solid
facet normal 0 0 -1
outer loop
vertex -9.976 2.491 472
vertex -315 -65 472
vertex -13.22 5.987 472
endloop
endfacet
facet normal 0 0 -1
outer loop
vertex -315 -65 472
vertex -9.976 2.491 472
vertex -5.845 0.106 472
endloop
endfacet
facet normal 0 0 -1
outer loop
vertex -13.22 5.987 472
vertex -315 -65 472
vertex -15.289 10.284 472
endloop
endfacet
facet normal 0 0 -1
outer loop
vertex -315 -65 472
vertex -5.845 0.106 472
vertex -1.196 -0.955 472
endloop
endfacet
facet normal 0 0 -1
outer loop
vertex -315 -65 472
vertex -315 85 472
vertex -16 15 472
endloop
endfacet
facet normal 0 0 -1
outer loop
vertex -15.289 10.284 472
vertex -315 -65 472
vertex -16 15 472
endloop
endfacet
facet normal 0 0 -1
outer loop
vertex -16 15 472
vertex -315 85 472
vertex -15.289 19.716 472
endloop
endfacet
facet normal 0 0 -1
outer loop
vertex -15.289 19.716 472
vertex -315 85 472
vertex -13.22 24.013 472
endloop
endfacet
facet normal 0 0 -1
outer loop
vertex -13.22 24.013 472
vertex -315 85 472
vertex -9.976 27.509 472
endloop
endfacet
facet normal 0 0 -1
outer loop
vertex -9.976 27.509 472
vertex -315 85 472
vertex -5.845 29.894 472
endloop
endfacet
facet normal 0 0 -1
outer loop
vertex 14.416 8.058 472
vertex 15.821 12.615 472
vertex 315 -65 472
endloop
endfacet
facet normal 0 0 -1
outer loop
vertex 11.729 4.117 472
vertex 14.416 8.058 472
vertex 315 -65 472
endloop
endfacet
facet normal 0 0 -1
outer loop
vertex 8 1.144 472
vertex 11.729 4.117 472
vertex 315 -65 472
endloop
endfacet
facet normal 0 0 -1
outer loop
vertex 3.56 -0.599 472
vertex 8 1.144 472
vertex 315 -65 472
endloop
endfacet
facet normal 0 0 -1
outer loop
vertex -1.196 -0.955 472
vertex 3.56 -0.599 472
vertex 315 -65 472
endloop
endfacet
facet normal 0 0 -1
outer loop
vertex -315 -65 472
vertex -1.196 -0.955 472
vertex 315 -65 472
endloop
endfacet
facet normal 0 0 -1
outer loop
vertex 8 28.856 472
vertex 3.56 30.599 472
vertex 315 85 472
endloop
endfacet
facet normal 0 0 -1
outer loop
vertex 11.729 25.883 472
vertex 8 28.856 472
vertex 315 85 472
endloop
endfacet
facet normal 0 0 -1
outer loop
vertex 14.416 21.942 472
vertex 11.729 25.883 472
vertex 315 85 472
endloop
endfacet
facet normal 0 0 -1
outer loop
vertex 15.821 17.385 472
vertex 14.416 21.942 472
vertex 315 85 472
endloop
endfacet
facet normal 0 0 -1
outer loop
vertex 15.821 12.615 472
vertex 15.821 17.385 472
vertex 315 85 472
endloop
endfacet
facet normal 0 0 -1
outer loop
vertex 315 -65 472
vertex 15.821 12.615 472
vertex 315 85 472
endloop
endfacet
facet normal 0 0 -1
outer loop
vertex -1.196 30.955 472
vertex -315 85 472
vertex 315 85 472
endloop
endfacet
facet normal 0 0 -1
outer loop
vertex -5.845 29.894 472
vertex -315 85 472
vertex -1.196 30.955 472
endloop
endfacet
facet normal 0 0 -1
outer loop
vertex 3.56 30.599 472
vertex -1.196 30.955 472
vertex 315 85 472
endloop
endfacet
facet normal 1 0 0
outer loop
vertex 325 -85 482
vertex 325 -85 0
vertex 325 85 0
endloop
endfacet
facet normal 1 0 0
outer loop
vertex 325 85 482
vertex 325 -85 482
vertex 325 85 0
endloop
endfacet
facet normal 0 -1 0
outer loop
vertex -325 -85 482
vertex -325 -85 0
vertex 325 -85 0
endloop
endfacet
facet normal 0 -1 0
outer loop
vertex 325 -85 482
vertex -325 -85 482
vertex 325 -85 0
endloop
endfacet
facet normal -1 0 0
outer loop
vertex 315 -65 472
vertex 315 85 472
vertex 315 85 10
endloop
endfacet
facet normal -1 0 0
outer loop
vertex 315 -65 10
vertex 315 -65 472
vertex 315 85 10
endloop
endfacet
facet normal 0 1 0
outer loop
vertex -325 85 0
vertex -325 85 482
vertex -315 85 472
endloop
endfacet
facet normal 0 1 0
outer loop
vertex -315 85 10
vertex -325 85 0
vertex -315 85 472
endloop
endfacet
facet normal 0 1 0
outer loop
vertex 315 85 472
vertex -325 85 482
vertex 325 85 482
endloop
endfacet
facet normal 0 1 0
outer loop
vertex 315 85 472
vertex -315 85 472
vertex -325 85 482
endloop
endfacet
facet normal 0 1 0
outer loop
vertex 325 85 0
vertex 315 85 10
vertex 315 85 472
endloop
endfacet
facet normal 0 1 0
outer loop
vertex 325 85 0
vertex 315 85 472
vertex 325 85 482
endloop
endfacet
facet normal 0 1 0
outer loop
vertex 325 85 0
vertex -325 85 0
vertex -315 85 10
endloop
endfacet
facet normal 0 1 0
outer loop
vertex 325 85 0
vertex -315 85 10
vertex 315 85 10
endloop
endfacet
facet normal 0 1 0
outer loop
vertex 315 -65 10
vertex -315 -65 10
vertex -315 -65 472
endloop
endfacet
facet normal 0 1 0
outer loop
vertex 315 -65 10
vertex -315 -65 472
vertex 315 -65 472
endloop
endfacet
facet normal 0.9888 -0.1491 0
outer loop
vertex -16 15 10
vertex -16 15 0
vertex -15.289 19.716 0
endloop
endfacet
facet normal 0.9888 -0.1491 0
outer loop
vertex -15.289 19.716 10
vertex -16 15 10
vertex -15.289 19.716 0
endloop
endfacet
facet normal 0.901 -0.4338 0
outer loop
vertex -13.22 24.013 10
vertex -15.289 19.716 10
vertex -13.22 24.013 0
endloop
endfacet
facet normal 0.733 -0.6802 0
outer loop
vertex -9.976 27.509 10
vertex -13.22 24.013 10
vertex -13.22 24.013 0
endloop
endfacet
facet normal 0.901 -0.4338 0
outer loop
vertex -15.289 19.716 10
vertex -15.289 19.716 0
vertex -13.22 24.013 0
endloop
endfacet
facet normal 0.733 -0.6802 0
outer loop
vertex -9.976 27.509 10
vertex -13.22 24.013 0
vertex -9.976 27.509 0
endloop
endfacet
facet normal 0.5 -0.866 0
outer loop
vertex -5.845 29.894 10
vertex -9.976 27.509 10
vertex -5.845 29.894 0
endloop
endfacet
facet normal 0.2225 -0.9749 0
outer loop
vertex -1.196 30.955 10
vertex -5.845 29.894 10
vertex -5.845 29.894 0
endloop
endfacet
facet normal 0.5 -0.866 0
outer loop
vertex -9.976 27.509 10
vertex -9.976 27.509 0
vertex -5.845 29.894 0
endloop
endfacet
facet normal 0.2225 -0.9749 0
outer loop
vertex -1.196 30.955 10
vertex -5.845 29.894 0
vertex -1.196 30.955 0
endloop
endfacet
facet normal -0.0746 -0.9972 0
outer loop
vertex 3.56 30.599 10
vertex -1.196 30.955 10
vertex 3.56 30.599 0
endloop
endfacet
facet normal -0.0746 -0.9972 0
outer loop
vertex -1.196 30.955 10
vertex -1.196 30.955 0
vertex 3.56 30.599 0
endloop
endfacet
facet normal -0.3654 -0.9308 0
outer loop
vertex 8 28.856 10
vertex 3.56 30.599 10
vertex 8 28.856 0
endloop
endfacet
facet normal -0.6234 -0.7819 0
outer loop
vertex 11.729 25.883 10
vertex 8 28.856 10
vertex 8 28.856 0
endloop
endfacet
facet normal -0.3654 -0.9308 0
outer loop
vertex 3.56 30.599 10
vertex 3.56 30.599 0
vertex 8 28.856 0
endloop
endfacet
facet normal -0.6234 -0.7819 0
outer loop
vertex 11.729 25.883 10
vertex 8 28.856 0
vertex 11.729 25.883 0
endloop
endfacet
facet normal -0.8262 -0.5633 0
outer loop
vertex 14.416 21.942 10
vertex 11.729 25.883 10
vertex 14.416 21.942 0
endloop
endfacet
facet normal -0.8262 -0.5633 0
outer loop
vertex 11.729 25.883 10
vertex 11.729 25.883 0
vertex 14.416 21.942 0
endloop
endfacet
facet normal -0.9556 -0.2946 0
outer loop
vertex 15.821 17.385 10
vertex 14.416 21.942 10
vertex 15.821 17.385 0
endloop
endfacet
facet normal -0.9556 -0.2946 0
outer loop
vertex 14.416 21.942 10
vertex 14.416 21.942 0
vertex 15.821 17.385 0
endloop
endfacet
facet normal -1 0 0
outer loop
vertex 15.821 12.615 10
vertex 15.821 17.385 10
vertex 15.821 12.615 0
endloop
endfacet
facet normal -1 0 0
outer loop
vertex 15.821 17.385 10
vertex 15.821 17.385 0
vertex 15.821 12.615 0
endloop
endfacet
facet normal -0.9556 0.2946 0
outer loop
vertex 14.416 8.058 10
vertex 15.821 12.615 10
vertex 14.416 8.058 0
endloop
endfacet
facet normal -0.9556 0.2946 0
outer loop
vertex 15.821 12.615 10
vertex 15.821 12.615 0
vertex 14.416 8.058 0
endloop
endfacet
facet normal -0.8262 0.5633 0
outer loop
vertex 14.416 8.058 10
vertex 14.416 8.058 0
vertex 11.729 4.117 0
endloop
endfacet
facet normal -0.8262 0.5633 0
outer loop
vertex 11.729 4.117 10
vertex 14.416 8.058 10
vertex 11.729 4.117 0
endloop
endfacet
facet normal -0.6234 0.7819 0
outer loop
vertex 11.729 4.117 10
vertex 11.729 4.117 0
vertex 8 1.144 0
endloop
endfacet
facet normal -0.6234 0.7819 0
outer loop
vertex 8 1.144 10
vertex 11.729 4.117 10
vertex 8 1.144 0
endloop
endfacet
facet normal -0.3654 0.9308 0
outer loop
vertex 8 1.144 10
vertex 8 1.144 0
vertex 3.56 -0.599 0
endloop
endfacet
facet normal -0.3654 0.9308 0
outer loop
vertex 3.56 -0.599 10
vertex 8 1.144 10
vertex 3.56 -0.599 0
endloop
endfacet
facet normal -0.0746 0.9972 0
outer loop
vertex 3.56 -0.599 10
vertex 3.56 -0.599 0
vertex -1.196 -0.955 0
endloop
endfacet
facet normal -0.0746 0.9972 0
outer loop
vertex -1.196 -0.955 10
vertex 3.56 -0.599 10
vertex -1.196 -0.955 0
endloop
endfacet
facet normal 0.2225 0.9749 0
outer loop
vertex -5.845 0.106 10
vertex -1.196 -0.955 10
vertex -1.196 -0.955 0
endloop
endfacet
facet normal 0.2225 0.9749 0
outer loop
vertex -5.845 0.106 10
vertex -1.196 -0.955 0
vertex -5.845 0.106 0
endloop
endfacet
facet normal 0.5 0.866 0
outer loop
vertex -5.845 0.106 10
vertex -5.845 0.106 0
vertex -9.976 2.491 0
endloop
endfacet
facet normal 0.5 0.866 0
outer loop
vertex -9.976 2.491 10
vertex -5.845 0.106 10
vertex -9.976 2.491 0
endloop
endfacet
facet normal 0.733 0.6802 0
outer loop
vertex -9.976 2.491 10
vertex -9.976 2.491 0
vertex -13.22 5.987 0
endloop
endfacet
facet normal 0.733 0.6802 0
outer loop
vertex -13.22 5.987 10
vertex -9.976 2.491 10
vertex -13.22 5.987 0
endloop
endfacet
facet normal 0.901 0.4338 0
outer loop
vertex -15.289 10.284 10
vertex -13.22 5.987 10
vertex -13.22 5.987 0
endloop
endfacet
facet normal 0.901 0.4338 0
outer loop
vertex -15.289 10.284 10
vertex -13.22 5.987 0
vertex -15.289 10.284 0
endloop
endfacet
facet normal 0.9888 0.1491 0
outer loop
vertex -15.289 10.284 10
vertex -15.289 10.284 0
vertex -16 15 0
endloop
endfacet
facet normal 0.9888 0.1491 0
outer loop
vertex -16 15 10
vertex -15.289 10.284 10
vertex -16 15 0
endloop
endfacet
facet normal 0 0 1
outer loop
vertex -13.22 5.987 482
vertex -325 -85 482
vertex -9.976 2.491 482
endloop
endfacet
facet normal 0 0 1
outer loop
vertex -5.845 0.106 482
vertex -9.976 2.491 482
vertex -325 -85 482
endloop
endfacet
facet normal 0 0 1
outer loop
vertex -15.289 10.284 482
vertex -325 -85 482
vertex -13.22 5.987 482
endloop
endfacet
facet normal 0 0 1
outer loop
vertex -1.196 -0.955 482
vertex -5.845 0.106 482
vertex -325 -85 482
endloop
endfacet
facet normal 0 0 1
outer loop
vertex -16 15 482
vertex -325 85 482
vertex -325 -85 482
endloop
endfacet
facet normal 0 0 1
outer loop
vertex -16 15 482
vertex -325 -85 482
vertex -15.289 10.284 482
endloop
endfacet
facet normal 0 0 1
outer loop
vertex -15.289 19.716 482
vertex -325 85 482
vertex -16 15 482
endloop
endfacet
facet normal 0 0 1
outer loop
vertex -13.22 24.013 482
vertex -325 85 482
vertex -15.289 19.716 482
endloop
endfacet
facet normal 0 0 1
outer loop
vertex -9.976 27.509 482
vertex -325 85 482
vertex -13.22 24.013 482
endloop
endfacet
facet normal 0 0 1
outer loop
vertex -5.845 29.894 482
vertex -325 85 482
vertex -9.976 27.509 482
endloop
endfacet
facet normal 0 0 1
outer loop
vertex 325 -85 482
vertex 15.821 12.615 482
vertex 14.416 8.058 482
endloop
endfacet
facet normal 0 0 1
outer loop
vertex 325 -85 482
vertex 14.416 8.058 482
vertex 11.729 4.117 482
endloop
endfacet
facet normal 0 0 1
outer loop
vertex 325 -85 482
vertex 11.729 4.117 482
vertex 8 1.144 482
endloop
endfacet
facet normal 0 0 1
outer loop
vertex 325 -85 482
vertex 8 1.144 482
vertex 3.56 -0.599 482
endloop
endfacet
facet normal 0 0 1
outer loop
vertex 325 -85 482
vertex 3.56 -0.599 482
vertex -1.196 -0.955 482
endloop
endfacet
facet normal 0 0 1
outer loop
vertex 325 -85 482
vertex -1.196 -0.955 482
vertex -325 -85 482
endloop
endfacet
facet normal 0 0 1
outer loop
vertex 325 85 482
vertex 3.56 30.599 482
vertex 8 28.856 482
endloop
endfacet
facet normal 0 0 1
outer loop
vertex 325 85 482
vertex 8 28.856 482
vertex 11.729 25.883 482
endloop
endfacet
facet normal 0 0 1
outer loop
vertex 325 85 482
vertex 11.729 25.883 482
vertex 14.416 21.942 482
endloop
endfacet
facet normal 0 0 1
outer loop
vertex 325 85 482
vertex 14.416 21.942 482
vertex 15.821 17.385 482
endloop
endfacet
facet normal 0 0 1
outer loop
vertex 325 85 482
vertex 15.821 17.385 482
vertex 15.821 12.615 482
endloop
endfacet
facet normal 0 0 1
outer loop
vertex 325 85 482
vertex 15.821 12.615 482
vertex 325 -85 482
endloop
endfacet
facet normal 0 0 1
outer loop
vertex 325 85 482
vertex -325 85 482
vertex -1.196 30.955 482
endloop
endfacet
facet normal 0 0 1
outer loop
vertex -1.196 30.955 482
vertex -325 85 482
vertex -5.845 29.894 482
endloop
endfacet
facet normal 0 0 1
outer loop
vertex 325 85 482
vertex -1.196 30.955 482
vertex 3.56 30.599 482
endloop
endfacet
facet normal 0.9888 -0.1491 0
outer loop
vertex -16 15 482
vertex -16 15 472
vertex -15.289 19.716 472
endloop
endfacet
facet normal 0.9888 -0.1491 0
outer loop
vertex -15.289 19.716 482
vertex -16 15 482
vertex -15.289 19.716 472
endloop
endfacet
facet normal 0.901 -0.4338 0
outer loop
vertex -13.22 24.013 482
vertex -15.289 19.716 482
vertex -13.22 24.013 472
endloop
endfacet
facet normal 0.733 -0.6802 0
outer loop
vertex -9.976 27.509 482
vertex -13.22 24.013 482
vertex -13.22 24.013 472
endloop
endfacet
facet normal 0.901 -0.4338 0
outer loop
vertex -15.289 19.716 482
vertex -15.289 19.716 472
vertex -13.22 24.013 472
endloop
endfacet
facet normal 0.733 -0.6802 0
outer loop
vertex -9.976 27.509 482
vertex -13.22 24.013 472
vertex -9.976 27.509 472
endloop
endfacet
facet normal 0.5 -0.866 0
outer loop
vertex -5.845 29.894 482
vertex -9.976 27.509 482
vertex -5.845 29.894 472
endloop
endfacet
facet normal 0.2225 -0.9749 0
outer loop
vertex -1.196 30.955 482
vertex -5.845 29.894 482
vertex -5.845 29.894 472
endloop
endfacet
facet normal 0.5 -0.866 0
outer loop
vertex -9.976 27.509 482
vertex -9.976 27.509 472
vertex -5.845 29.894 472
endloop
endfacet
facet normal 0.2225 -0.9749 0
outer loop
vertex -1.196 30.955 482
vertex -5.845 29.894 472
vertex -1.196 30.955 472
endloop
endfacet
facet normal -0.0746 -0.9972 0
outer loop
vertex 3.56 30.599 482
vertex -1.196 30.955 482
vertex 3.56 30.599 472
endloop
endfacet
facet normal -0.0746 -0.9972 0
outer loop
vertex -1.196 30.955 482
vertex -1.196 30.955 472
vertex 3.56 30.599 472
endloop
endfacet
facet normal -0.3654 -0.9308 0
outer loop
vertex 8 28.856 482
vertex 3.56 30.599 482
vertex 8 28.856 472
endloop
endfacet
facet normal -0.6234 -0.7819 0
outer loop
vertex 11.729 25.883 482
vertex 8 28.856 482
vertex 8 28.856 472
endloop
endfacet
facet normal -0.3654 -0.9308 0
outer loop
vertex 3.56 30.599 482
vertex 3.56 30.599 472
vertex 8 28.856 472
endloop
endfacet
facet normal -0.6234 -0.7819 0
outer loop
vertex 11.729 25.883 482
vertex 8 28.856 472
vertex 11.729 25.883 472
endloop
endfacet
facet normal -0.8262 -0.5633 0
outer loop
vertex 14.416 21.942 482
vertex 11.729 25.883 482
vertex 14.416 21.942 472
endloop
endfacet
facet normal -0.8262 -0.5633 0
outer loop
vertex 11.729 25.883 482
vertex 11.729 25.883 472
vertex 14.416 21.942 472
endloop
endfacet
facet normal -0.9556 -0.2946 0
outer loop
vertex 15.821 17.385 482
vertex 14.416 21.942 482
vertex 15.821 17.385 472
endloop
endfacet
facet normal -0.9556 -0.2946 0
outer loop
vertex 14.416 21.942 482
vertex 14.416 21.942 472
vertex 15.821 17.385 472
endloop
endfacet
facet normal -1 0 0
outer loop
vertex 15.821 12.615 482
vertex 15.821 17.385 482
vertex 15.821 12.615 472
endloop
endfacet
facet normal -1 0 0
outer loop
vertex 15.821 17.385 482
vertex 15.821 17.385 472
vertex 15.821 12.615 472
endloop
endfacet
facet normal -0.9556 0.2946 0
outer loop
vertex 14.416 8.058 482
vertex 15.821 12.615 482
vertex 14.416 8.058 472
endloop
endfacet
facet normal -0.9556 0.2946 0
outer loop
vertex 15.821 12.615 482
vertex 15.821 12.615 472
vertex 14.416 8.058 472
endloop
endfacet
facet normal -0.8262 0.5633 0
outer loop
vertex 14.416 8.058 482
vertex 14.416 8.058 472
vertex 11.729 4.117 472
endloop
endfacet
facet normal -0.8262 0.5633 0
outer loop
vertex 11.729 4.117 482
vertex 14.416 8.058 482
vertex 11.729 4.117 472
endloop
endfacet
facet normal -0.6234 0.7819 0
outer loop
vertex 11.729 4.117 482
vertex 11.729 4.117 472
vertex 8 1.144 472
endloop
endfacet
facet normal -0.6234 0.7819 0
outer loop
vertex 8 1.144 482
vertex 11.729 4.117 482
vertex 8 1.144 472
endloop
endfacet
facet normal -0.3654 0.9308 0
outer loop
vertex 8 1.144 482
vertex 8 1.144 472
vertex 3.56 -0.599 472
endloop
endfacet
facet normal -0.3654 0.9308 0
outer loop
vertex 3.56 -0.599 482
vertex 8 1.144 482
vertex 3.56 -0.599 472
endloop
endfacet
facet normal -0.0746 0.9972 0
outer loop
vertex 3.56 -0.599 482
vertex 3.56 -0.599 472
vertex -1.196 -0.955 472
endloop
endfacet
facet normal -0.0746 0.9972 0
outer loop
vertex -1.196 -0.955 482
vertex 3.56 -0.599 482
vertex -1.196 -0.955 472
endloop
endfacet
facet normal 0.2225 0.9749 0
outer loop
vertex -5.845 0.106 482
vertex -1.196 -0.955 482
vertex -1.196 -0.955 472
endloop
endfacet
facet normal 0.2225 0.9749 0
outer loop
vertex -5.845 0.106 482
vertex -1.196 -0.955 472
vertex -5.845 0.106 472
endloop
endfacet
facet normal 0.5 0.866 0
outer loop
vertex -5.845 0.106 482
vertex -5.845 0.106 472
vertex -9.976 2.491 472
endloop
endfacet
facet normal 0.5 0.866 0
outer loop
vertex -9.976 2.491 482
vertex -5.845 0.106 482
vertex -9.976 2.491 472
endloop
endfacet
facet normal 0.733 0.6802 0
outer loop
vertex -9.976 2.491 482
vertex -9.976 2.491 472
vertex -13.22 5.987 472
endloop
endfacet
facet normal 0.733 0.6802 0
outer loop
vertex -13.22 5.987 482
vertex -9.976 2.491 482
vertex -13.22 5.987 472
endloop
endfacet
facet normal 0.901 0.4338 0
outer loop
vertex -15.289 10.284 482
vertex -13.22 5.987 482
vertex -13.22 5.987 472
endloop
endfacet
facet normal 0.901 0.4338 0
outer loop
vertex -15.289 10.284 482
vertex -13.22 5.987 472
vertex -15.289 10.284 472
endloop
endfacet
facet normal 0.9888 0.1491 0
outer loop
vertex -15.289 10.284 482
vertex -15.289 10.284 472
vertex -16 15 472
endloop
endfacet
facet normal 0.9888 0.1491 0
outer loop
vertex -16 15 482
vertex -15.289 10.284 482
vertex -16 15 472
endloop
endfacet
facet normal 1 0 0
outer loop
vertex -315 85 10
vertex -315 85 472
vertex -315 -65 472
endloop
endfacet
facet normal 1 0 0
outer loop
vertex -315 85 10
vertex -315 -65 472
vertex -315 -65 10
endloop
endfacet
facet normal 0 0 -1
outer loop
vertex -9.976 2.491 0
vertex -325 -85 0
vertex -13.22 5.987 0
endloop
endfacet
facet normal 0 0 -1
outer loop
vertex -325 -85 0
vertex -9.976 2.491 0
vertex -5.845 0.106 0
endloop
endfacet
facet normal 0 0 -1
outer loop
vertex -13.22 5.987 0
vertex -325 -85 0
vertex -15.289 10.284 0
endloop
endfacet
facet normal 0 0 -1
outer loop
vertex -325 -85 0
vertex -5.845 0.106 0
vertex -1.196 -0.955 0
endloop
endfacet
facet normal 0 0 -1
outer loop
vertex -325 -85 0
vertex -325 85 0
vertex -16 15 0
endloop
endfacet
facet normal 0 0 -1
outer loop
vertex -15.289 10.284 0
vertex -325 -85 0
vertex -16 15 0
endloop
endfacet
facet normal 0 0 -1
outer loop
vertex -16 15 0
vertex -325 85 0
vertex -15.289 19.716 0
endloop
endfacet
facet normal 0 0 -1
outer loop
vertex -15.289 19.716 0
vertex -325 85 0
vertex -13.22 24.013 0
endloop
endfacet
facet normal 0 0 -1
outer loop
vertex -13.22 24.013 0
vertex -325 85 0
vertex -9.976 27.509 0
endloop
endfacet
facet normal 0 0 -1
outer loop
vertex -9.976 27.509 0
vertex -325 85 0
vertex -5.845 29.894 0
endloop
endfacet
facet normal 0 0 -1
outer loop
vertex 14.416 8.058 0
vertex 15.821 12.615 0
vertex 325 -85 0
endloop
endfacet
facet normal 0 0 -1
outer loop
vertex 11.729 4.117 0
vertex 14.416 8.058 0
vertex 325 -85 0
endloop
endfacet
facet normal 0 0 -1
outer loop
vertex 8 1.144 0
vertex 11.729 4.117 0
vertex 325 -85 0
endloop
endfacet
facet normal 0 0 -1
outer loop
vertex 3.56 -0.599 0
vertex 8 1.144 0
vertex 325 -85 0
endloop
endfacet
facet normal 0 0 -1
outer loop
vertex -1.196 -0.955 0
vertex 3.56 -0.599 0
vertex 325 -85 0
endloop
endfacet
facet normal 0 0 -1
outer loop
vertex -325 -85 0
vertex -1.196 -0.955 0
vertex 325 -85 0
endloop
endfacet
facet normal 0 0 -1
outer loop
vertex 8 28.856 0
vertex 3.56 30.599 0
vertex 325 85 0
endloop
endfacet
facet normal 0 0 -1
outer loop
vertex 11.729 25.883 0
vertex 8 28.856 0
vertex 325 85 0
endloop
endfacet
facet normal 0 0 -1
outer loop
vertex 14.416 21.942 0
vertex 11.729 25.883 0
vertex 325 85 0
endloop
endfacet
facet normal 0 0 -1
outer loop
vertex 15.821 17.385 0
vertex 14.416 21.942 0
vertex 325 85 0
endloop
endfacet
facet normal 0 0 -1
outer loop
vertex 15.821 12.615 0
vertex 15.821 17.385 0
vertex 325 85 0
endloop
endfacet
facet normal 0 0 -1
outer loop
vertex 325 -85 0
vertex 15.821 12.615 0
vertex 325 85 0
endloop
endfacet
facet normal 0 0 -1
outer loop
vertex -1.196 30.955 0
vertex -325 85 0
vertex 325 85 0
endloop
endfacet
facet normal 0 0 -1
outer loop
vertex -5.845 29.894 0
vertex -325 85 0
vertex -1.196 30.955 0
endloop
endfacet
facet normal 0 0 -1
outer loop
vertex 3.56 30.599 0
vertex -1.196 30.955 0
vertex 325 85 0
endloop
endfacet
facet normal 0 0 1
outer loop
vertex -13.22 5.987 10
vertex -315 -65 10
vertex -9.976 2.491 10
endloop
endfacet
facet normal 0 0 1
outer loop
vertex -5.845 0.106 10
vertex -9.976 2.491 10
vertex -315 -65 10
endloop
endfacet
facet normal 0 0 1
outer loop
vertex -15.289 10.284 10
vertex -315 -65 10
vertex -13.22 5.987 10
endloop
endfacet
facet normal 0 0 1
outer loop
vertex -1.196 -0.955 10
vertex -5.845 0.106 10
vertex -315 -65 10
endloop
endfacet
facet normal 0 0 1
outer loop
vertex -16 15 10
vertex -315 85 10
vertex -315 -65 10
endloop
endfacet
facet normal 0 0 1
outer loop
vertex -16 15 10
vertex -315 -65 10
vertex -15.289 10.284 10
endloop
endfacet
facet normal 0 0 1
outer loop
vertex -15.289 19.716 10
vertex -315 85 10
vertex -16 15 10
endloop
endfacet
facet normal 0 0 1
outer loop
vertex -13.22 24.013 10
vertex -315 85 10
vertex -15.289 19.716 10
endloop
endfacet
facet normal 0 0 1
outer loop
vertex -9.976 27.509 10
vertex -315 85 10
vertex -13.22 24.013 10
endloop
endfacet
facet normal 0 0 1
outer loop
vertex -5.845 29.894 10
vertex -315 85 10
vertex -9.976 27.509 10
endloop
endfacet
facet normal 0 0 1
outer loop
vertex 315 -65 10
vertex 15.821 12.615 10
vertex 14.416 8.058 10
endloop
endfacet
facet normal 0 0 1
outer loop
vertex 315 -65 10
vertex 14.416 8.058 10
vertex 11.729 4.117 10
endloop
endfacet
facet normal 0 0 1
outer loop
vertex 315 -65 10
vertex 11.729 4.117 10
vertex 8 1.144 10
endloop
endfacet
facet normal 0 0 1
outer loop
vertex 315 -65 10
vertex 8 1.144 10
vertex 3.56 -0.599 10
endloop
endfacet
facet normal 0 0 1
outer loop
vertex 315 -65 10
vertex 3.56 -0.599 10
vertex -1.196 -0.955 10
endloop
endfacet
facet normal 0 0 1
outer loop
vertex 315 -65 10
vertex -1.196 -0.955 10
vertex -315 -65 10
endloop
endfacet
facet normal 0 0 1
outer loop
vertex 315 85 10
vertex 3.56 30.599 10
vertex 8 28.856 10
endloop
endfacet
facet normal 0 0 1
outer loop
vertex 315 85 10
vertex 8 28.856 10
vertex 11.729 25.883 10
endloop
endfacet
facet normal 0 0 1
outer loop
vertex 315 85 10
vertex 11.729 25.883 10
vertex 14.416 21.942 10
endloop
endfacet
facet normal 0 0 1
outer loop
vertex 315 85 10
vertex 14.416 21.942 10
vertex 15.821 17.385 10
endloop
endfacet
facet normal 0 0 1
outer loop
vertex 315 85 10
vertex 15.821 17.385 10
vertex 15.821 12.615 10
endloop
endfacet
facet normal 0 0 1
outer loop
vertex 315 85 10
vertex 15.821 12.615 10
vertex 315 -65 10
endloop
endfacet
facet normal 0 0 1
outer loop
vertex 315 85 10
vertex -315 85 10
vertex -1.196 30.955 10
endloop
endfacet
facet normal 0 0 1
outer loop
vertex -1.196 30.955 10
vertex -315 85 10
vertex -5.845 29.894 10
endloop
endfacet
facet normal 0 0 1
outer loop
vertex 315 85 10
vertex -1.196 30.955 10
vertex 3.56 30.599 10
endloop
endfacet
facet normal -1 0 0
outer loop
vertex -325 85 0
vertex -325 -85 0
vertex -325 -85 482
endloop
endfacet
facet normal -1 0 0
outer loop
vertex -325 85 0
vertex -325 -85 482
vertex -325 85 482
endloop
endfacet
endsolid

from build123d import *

# Parameters (mm, degrees)
SKETCH1_W           = 650
SKETCH1_H           = 170
BOSS_EXTRUDE1_DEPTH = 482
SKETCH2_R           = 16
CUT_EXTRUDE1_DEPTH  = 483
SKETCH3_W           = 630
SKETCH3_H           = 462
CUT_EXTRUDE2_DEPTH  = 150


with BuildPart() as part:
    # Sketch1 → Boss-Extrude1 (new body)
    with BuildSketch(Plane.XY):
        Rectangle(SKETCH1_W, SKETCH1_H)
    extrude(amount=BOSS_EXTRUDE1_DEPTH)

    # Sketch2 → Cut-Extrude1 (cut, through all)
    with BuildSketch(Plane(origin=(0, 0, 0), x_dir=(-1, 0, 0), z_dir=(0, 0, -1))):
        with Locations((0, 15)):
            Circle(SKETCH2_R)
    extrude(amount=-CUT_EXTRUDE1_DEPTH, mode=Mode.SUBTRACT)

    # Sketch3 → Cut-Extrude2 (cut)
    with BuildSketch(Plane(origin=(0, 85, 0), x_dir=(1, 0, 0), z_dir=(0, 1, 0))):
        with Locations((0, -241)):
            Rectangle(SKETCH3_W, SKETCH3_H)
    extrude(amount=-CUT_EXTRUDE2_DEPTH, mode=Mode.SUBTRACT)


solid = part.part
